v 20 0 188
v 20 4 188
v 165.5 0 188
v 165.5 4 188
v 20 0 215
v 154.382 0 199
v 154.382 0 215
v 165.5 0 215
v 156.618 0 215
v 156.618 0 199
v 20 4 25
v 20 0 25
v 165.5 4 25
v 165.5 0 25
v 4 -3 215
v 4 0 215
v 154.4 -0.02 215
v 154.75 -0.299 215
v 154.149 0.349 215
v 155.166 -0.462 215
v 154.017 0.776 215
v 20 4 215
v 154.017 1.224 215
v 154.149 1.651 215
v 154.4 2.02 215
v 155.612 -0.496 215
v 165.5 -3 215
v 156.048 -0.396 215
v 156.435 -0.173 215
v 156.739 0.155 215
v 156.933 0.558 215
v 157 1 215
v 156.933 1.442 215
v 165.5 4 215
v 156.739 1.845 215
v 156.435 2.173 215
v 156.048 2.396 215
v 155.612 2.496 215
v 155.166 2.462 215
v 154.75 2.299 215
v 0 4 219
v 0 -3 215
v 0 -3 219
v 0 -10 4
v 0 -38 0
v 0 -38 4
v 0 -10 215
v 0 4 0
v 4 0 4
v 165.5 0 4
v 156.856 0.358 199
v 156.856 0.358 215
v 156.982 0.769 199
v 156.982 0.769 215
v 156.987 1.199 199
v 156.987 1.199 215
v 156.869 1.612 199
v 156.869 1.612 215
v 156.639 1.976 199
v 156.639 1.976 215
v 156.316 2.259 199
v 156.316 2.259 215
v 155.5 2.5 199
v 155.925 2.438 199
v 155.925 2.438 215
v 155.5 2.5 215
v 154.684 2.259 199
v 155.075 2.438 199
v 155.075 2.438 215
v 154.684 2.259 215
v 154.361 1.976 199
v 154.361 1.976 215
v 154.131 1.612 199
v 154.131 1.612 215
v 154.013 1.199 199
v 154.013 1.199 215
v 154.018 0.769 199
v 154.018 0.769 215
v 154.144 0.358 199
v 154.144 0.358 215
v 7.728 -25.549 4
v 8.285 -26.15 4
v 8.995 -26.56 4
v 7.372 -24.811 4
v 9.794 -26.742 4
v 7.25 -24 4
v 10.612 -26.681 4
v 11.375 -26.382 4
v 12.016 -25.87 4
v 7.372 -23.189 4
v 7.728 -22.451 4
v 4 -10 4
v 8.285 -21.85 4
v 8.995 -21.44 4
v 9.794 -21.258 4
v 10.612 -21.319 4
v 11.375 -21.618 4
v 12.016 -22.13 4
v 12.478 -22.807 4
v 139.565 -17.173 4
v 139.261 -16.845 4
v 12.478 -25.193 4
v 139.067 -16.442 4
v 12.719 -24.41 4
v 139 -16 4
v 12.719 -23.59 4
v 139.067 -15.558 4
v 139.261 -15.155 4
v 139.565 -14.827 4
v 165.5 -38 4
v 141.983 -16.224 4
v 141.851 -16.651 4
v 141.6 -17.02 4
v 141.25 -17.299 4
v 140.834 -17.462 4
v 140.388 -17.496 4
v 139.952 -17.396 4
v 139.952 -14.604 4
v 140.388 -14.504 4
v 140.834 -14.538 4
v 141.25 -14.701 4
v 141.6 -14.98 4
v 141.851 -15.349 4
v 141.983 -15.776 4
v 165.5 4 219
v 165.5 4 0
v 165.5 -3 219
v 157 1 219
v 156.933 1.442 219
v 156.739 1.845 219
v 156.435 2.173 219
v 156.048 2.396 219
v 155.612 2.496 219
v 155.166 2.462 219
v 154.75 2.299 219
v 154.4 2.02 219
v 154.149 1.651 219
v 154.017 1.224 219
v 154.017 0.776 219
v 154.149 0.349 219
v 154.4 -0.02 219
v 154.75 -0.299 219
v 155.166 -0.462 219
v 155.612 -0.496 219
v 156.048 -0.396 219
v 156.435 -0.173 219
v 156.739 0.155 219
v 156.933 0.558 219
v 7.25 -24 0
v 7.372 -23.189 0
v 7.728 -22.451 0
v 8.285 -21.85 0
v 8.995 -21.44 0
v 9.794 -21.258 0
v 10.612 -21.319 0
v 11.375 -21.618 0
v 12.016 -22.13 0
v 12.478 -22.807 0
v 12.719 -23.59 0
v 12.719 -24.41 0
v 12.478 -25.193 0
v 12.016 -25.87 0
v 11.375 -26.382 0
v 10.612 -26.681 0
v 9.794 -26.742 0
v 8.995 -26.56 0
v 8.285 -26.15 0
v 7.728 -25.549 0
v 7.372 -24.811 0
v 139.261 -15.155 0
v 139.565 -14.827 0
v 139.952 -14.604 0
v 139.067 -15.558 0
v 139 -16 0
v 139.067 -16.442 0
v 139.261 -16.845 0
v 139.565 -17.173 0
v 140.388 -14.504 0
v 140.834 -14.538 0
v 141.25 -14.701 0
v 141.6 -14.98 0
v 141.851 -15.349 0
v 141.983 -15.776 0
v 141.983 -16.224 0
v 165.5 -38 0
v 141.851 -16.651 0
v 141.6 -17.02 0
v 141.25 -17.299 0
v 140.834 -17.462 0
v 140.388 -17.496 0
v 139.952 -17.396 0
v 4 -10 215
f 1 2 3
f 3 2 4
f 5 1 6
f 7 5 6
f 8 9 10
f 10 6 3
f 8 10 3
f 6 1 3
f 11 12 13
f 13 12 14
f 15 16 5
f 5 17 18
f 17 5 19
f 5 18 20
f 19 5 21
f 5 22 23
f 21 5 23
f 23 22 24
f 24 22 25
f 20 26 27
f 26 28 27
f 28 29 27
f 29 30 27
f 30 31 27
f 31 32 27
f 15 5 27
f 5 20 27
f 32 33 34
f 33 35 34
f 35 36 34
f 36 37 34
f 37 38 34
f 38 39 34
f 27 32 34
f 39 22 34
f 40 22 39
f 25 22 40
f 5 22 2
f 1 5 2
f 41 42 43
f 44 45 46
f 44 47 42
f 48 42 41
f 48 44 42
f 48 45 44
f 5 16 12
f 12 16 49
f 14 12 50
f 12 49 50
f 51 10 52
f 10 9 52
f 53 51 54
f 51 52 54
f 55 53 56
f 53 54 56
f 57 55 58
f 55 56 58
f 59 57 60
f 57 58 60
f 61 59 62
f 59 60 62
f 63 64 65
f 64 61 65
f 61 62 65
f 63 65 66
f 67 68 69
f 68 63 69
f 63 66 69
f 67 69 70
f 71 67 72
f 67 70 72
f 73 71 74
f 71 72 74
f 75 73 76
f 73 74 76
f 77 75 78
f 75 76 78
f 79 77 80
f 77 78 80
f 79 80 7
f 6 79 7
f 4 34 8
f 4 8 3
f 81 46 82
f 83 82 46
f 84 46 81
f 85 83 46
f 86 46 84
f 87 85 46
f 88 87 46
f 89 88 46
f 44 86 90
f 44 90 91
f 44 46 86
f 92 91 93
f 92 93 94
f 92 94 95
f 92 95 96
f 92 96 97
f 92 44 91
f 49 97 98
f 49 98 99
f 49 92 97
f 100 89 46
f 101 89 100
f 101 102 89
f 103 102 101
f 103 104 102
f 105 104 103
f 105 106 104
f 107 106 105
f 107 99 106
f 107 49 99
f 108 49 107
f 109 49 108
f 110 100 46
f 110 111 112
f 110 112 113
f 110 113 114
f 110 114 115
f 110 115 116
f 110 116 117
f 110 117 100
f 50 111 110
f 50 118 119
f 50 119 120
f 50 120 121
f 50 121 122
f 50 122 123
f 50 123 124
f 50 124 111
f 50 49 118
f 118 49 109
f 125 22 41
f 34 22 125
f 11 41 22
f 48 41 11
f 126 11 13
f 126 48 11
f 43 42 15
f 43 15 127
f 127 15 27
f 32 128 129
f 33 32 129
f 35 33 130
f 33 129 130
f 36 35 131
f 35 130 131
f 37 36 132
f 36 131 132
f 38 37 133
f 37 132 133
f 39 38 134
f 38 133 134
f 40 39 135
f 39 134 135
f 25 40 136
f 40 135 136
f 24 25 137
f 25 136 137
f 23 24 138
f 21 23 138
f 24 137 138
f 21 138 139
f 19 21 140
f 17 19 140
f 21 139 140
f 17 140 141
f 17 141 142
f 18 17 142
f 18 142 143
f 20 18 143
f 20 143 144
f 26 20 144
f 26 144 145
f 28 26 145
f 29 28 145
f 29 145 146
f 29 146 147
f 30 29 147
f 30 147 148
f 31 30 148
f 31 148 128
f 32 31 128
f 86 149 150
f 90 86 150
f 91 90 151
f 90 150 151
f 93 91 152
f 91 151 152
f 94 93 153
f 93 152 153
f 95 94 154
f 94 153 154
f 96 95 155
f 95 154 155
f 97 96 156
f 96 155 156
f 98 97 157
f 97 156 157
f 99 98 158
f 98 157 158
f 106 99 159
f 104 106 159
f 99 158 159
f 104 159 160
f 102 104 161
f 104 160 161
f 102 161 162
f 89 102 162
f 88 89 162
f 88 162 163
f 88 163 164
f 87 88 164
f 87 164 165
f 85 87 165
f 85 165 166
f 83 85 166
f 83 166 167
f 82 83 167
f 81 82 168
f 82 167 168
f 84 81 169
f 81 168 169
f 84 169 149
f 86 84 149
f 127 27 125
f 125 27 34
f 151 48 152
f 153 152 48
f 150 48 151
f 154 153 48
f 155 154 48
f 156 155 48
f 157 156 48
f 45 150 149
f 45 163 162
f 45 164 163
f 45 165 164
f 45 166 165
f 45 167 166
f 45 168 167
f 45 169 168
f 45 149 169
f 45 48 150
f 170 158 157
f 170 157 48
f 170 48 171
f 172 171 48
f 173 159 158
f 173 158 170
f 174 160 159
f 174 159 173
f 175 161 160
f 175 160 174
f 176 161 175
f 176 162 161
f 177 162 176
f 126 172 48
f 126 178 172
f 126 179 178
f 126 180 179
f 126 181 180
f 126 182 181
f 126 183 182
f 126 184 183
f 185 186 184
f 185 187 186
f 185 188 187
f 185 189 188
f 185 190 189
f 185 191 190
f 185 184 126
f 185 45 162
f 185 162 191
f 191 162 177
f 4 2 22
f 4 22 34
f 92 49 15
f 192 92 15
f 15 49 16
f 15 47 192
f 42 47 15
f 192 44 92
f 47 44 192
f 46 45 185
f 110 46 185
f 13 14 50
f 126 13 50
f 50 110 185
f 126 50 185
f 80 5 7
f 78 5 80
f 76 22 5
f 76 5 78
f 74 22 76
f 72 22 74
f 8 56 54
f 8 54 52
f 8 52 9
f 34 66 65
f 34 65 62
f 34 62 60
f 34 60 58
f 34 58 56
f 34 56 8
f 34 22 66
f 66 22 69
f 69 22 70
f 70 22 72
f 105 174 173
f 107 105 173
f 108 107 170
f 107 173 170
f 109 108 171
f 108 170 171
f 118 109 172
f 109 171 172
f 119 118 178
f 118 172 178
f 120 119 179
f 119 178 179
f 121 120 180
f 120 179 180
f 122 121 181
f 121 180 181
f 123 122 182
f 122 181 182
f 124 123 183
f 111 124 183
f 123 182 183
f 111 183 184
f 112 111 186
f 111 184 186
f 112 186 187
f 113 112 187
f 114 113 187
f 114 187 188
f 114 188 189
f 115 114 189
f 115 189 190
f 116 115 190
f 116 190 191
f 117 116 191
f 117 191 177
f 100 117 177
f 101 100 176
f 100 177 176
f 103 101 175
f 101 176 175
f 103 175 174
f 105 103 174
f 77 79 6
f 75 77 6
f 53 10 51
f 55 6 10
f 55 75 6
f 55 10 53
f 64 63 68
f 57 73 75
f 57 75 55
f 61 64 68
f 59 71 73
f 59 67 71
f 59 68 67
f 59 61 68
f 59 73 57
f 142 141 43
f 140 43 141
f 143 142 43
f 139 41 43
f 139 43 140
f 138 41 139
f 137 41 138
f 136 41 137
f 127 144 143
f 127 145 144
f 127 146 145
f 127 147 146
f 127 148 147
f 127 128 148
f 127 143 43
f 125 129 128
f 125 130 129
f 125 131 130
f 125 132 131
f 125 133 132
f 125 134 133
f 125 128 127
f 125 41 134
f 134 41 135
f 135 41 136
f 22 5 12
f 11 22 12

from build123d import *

# Parameters (mm, degrees)
SKETCH_1_W          = 165.5
SKETCH_1_H          = 38
EXTRUDE_1_DEPTH     = 4
SKETCH_2_W          = 20
SKETCH_2_H          = 215
EXTRUDE_2_DEPTH     = 4
SKETCH_3_W          = 211
SKETCH_3_H          = 10
EXTRUDE_3_DEPTH     = 4
SKETCH_4_W          = 145.5
SKETCH_4_H          = 25
EXTRUDE_4_DEPTH     = 4
SKETCH_5_R          = 1.5
CUT_EXTRUDE_1_DEPTH = 4
SKETCH_6_W          = 165.5
SKETCH_6_H          = 7
EXTRUDE_5_DEPTH     = 4
SKETCH_7_W          = 145.5
SKETCH_7_H          = 27
EXTRUDE_6_DEPTH     = 4
SKETCH_8_R          = 2.75
CUT_EXTRUDE_2_DEPTH = 4
SKETCH_9_R          = 1.5
CUT_EXTRUDE_3_DEPTH = 20


with BuildPart() as part:
    # 草图1 → 凸台-拉伸1 (new body)
    with BuildSketch(Plane.XY):
        with Locations((82.75, -19)):
            Rectangle(SKETCH_1_W, SKETCH_1_H)
    extrude(amount=EXTRUDE_1_DEPTH)

    # 草图2 → 凸台-拉伸2 (add)
    with BuildSketch(Plane(origin=(0, 0, 0), x_dir=(1, 0, 0), z_dir=(0, 1, 0))):
        with Locations((10, -107.5)):
            Rectangle(SKETCH_2_W, SKETCH_2_H)
    extrude(amount=EXTRUDE_2_DEPTH)

    # 草图3 → 凸台-拉伸3 (add)
    with BuildSketch(Plane.ZY):
        with Locations((109.5, -5)):
            Rectangle(SKETCH_3_W, SKETCH_3_H)
    extrude(amount=-EXTRUDE_3_DEPTH)

    # 草图4 → 凸台-拉伸4 (add)
    with BuildSketch(Plane(origin=(0, 0, 0), x_dir=(1, 0, 0), z_dir=(0, 1, 0))):
        with Locations((92.75, -12.5)):
            Rectangle(SKETCH_4_W, SKETCH_4_H)
    extrude(amount=EXTRUDE_4_DEPTH)

    # 草图5 → 切除-拉伸1 (cut)
    with BuildSketch(Plane(origin=(0, 0, 0), x_dir=(-1, 0, 0), z_dir=(0, 0, -1))):
        with Locations((-140.5, -16)):
            Circle(SKETCH_5_R)
    extrude(amount=-CUT_EXTRUDE_1_DEPTH, mode=Mode.SUBTRACT)

    # 草图6 → 凸台-拉伸5 (add)
    with BuildSketch(Plane.XY.offset(215)):
        with Locations((82.75, 0.5)):
            Rectangle(SKETCH_6_W, SKETCH_6_H)
    extrude(amount=EXTRUDE_5_DEPTH)

    # 草图8 → 切除-拉伸2 (cut)
    with BuildSketch(Plane(origin=(0, 0, 0), x_dir=(-1, 0, 0), z_dir=(0, 0, -1))):
        with Locations((-10, -24)):
            Circle(SKETCH_8_R)
    extrude(amount=-CUT_EXTRUDE_2_DEPTH, mode=Mode.SUBTRACT)


with BuildPart() as body_2:
    # 草图7 → 凸台-拉伸6 (new body)
    with BuildSketch(Plane(origin=(0, 4, 0), x_dir=(1, 0, 0), z_dir=(0, 1, 0))):
        with Locations((92.75, -201.5)):
            Rectangle(SKETCH_7_W, SKETCH_7_H)
    extrude(amount=-EXTRUDE_6_DEPTH)


with BuildPart() as cut_extrude_3_tool:
    # 草图9 → 切除-拉伸3 (new body)
    with BuildSketch(Plane.XY.offset(219)):
        with Locations((155.5, 1)):
            Circle(SKETCH_9_R)
    extrude(amount=-CUT_EXTRUDE_3_DEPTH)


with BuildPart() as part_1:
    add(part.part)

    # 切除-拉伸3: cut by cut_extrude_3_tool
    add(cut_extrude_3_tool.part, mode=Mode.SUBTRACT)


with BuildPart() as body_2_1:
    add(body_2.part)

    # 切除-拉伸3: cut by cut_extrude_3_tool
    add(cut_extrude_3_tool.part, mode=Mode.SUBTRACT)


solid = Compound([part_1.part, body_2_1.part])
